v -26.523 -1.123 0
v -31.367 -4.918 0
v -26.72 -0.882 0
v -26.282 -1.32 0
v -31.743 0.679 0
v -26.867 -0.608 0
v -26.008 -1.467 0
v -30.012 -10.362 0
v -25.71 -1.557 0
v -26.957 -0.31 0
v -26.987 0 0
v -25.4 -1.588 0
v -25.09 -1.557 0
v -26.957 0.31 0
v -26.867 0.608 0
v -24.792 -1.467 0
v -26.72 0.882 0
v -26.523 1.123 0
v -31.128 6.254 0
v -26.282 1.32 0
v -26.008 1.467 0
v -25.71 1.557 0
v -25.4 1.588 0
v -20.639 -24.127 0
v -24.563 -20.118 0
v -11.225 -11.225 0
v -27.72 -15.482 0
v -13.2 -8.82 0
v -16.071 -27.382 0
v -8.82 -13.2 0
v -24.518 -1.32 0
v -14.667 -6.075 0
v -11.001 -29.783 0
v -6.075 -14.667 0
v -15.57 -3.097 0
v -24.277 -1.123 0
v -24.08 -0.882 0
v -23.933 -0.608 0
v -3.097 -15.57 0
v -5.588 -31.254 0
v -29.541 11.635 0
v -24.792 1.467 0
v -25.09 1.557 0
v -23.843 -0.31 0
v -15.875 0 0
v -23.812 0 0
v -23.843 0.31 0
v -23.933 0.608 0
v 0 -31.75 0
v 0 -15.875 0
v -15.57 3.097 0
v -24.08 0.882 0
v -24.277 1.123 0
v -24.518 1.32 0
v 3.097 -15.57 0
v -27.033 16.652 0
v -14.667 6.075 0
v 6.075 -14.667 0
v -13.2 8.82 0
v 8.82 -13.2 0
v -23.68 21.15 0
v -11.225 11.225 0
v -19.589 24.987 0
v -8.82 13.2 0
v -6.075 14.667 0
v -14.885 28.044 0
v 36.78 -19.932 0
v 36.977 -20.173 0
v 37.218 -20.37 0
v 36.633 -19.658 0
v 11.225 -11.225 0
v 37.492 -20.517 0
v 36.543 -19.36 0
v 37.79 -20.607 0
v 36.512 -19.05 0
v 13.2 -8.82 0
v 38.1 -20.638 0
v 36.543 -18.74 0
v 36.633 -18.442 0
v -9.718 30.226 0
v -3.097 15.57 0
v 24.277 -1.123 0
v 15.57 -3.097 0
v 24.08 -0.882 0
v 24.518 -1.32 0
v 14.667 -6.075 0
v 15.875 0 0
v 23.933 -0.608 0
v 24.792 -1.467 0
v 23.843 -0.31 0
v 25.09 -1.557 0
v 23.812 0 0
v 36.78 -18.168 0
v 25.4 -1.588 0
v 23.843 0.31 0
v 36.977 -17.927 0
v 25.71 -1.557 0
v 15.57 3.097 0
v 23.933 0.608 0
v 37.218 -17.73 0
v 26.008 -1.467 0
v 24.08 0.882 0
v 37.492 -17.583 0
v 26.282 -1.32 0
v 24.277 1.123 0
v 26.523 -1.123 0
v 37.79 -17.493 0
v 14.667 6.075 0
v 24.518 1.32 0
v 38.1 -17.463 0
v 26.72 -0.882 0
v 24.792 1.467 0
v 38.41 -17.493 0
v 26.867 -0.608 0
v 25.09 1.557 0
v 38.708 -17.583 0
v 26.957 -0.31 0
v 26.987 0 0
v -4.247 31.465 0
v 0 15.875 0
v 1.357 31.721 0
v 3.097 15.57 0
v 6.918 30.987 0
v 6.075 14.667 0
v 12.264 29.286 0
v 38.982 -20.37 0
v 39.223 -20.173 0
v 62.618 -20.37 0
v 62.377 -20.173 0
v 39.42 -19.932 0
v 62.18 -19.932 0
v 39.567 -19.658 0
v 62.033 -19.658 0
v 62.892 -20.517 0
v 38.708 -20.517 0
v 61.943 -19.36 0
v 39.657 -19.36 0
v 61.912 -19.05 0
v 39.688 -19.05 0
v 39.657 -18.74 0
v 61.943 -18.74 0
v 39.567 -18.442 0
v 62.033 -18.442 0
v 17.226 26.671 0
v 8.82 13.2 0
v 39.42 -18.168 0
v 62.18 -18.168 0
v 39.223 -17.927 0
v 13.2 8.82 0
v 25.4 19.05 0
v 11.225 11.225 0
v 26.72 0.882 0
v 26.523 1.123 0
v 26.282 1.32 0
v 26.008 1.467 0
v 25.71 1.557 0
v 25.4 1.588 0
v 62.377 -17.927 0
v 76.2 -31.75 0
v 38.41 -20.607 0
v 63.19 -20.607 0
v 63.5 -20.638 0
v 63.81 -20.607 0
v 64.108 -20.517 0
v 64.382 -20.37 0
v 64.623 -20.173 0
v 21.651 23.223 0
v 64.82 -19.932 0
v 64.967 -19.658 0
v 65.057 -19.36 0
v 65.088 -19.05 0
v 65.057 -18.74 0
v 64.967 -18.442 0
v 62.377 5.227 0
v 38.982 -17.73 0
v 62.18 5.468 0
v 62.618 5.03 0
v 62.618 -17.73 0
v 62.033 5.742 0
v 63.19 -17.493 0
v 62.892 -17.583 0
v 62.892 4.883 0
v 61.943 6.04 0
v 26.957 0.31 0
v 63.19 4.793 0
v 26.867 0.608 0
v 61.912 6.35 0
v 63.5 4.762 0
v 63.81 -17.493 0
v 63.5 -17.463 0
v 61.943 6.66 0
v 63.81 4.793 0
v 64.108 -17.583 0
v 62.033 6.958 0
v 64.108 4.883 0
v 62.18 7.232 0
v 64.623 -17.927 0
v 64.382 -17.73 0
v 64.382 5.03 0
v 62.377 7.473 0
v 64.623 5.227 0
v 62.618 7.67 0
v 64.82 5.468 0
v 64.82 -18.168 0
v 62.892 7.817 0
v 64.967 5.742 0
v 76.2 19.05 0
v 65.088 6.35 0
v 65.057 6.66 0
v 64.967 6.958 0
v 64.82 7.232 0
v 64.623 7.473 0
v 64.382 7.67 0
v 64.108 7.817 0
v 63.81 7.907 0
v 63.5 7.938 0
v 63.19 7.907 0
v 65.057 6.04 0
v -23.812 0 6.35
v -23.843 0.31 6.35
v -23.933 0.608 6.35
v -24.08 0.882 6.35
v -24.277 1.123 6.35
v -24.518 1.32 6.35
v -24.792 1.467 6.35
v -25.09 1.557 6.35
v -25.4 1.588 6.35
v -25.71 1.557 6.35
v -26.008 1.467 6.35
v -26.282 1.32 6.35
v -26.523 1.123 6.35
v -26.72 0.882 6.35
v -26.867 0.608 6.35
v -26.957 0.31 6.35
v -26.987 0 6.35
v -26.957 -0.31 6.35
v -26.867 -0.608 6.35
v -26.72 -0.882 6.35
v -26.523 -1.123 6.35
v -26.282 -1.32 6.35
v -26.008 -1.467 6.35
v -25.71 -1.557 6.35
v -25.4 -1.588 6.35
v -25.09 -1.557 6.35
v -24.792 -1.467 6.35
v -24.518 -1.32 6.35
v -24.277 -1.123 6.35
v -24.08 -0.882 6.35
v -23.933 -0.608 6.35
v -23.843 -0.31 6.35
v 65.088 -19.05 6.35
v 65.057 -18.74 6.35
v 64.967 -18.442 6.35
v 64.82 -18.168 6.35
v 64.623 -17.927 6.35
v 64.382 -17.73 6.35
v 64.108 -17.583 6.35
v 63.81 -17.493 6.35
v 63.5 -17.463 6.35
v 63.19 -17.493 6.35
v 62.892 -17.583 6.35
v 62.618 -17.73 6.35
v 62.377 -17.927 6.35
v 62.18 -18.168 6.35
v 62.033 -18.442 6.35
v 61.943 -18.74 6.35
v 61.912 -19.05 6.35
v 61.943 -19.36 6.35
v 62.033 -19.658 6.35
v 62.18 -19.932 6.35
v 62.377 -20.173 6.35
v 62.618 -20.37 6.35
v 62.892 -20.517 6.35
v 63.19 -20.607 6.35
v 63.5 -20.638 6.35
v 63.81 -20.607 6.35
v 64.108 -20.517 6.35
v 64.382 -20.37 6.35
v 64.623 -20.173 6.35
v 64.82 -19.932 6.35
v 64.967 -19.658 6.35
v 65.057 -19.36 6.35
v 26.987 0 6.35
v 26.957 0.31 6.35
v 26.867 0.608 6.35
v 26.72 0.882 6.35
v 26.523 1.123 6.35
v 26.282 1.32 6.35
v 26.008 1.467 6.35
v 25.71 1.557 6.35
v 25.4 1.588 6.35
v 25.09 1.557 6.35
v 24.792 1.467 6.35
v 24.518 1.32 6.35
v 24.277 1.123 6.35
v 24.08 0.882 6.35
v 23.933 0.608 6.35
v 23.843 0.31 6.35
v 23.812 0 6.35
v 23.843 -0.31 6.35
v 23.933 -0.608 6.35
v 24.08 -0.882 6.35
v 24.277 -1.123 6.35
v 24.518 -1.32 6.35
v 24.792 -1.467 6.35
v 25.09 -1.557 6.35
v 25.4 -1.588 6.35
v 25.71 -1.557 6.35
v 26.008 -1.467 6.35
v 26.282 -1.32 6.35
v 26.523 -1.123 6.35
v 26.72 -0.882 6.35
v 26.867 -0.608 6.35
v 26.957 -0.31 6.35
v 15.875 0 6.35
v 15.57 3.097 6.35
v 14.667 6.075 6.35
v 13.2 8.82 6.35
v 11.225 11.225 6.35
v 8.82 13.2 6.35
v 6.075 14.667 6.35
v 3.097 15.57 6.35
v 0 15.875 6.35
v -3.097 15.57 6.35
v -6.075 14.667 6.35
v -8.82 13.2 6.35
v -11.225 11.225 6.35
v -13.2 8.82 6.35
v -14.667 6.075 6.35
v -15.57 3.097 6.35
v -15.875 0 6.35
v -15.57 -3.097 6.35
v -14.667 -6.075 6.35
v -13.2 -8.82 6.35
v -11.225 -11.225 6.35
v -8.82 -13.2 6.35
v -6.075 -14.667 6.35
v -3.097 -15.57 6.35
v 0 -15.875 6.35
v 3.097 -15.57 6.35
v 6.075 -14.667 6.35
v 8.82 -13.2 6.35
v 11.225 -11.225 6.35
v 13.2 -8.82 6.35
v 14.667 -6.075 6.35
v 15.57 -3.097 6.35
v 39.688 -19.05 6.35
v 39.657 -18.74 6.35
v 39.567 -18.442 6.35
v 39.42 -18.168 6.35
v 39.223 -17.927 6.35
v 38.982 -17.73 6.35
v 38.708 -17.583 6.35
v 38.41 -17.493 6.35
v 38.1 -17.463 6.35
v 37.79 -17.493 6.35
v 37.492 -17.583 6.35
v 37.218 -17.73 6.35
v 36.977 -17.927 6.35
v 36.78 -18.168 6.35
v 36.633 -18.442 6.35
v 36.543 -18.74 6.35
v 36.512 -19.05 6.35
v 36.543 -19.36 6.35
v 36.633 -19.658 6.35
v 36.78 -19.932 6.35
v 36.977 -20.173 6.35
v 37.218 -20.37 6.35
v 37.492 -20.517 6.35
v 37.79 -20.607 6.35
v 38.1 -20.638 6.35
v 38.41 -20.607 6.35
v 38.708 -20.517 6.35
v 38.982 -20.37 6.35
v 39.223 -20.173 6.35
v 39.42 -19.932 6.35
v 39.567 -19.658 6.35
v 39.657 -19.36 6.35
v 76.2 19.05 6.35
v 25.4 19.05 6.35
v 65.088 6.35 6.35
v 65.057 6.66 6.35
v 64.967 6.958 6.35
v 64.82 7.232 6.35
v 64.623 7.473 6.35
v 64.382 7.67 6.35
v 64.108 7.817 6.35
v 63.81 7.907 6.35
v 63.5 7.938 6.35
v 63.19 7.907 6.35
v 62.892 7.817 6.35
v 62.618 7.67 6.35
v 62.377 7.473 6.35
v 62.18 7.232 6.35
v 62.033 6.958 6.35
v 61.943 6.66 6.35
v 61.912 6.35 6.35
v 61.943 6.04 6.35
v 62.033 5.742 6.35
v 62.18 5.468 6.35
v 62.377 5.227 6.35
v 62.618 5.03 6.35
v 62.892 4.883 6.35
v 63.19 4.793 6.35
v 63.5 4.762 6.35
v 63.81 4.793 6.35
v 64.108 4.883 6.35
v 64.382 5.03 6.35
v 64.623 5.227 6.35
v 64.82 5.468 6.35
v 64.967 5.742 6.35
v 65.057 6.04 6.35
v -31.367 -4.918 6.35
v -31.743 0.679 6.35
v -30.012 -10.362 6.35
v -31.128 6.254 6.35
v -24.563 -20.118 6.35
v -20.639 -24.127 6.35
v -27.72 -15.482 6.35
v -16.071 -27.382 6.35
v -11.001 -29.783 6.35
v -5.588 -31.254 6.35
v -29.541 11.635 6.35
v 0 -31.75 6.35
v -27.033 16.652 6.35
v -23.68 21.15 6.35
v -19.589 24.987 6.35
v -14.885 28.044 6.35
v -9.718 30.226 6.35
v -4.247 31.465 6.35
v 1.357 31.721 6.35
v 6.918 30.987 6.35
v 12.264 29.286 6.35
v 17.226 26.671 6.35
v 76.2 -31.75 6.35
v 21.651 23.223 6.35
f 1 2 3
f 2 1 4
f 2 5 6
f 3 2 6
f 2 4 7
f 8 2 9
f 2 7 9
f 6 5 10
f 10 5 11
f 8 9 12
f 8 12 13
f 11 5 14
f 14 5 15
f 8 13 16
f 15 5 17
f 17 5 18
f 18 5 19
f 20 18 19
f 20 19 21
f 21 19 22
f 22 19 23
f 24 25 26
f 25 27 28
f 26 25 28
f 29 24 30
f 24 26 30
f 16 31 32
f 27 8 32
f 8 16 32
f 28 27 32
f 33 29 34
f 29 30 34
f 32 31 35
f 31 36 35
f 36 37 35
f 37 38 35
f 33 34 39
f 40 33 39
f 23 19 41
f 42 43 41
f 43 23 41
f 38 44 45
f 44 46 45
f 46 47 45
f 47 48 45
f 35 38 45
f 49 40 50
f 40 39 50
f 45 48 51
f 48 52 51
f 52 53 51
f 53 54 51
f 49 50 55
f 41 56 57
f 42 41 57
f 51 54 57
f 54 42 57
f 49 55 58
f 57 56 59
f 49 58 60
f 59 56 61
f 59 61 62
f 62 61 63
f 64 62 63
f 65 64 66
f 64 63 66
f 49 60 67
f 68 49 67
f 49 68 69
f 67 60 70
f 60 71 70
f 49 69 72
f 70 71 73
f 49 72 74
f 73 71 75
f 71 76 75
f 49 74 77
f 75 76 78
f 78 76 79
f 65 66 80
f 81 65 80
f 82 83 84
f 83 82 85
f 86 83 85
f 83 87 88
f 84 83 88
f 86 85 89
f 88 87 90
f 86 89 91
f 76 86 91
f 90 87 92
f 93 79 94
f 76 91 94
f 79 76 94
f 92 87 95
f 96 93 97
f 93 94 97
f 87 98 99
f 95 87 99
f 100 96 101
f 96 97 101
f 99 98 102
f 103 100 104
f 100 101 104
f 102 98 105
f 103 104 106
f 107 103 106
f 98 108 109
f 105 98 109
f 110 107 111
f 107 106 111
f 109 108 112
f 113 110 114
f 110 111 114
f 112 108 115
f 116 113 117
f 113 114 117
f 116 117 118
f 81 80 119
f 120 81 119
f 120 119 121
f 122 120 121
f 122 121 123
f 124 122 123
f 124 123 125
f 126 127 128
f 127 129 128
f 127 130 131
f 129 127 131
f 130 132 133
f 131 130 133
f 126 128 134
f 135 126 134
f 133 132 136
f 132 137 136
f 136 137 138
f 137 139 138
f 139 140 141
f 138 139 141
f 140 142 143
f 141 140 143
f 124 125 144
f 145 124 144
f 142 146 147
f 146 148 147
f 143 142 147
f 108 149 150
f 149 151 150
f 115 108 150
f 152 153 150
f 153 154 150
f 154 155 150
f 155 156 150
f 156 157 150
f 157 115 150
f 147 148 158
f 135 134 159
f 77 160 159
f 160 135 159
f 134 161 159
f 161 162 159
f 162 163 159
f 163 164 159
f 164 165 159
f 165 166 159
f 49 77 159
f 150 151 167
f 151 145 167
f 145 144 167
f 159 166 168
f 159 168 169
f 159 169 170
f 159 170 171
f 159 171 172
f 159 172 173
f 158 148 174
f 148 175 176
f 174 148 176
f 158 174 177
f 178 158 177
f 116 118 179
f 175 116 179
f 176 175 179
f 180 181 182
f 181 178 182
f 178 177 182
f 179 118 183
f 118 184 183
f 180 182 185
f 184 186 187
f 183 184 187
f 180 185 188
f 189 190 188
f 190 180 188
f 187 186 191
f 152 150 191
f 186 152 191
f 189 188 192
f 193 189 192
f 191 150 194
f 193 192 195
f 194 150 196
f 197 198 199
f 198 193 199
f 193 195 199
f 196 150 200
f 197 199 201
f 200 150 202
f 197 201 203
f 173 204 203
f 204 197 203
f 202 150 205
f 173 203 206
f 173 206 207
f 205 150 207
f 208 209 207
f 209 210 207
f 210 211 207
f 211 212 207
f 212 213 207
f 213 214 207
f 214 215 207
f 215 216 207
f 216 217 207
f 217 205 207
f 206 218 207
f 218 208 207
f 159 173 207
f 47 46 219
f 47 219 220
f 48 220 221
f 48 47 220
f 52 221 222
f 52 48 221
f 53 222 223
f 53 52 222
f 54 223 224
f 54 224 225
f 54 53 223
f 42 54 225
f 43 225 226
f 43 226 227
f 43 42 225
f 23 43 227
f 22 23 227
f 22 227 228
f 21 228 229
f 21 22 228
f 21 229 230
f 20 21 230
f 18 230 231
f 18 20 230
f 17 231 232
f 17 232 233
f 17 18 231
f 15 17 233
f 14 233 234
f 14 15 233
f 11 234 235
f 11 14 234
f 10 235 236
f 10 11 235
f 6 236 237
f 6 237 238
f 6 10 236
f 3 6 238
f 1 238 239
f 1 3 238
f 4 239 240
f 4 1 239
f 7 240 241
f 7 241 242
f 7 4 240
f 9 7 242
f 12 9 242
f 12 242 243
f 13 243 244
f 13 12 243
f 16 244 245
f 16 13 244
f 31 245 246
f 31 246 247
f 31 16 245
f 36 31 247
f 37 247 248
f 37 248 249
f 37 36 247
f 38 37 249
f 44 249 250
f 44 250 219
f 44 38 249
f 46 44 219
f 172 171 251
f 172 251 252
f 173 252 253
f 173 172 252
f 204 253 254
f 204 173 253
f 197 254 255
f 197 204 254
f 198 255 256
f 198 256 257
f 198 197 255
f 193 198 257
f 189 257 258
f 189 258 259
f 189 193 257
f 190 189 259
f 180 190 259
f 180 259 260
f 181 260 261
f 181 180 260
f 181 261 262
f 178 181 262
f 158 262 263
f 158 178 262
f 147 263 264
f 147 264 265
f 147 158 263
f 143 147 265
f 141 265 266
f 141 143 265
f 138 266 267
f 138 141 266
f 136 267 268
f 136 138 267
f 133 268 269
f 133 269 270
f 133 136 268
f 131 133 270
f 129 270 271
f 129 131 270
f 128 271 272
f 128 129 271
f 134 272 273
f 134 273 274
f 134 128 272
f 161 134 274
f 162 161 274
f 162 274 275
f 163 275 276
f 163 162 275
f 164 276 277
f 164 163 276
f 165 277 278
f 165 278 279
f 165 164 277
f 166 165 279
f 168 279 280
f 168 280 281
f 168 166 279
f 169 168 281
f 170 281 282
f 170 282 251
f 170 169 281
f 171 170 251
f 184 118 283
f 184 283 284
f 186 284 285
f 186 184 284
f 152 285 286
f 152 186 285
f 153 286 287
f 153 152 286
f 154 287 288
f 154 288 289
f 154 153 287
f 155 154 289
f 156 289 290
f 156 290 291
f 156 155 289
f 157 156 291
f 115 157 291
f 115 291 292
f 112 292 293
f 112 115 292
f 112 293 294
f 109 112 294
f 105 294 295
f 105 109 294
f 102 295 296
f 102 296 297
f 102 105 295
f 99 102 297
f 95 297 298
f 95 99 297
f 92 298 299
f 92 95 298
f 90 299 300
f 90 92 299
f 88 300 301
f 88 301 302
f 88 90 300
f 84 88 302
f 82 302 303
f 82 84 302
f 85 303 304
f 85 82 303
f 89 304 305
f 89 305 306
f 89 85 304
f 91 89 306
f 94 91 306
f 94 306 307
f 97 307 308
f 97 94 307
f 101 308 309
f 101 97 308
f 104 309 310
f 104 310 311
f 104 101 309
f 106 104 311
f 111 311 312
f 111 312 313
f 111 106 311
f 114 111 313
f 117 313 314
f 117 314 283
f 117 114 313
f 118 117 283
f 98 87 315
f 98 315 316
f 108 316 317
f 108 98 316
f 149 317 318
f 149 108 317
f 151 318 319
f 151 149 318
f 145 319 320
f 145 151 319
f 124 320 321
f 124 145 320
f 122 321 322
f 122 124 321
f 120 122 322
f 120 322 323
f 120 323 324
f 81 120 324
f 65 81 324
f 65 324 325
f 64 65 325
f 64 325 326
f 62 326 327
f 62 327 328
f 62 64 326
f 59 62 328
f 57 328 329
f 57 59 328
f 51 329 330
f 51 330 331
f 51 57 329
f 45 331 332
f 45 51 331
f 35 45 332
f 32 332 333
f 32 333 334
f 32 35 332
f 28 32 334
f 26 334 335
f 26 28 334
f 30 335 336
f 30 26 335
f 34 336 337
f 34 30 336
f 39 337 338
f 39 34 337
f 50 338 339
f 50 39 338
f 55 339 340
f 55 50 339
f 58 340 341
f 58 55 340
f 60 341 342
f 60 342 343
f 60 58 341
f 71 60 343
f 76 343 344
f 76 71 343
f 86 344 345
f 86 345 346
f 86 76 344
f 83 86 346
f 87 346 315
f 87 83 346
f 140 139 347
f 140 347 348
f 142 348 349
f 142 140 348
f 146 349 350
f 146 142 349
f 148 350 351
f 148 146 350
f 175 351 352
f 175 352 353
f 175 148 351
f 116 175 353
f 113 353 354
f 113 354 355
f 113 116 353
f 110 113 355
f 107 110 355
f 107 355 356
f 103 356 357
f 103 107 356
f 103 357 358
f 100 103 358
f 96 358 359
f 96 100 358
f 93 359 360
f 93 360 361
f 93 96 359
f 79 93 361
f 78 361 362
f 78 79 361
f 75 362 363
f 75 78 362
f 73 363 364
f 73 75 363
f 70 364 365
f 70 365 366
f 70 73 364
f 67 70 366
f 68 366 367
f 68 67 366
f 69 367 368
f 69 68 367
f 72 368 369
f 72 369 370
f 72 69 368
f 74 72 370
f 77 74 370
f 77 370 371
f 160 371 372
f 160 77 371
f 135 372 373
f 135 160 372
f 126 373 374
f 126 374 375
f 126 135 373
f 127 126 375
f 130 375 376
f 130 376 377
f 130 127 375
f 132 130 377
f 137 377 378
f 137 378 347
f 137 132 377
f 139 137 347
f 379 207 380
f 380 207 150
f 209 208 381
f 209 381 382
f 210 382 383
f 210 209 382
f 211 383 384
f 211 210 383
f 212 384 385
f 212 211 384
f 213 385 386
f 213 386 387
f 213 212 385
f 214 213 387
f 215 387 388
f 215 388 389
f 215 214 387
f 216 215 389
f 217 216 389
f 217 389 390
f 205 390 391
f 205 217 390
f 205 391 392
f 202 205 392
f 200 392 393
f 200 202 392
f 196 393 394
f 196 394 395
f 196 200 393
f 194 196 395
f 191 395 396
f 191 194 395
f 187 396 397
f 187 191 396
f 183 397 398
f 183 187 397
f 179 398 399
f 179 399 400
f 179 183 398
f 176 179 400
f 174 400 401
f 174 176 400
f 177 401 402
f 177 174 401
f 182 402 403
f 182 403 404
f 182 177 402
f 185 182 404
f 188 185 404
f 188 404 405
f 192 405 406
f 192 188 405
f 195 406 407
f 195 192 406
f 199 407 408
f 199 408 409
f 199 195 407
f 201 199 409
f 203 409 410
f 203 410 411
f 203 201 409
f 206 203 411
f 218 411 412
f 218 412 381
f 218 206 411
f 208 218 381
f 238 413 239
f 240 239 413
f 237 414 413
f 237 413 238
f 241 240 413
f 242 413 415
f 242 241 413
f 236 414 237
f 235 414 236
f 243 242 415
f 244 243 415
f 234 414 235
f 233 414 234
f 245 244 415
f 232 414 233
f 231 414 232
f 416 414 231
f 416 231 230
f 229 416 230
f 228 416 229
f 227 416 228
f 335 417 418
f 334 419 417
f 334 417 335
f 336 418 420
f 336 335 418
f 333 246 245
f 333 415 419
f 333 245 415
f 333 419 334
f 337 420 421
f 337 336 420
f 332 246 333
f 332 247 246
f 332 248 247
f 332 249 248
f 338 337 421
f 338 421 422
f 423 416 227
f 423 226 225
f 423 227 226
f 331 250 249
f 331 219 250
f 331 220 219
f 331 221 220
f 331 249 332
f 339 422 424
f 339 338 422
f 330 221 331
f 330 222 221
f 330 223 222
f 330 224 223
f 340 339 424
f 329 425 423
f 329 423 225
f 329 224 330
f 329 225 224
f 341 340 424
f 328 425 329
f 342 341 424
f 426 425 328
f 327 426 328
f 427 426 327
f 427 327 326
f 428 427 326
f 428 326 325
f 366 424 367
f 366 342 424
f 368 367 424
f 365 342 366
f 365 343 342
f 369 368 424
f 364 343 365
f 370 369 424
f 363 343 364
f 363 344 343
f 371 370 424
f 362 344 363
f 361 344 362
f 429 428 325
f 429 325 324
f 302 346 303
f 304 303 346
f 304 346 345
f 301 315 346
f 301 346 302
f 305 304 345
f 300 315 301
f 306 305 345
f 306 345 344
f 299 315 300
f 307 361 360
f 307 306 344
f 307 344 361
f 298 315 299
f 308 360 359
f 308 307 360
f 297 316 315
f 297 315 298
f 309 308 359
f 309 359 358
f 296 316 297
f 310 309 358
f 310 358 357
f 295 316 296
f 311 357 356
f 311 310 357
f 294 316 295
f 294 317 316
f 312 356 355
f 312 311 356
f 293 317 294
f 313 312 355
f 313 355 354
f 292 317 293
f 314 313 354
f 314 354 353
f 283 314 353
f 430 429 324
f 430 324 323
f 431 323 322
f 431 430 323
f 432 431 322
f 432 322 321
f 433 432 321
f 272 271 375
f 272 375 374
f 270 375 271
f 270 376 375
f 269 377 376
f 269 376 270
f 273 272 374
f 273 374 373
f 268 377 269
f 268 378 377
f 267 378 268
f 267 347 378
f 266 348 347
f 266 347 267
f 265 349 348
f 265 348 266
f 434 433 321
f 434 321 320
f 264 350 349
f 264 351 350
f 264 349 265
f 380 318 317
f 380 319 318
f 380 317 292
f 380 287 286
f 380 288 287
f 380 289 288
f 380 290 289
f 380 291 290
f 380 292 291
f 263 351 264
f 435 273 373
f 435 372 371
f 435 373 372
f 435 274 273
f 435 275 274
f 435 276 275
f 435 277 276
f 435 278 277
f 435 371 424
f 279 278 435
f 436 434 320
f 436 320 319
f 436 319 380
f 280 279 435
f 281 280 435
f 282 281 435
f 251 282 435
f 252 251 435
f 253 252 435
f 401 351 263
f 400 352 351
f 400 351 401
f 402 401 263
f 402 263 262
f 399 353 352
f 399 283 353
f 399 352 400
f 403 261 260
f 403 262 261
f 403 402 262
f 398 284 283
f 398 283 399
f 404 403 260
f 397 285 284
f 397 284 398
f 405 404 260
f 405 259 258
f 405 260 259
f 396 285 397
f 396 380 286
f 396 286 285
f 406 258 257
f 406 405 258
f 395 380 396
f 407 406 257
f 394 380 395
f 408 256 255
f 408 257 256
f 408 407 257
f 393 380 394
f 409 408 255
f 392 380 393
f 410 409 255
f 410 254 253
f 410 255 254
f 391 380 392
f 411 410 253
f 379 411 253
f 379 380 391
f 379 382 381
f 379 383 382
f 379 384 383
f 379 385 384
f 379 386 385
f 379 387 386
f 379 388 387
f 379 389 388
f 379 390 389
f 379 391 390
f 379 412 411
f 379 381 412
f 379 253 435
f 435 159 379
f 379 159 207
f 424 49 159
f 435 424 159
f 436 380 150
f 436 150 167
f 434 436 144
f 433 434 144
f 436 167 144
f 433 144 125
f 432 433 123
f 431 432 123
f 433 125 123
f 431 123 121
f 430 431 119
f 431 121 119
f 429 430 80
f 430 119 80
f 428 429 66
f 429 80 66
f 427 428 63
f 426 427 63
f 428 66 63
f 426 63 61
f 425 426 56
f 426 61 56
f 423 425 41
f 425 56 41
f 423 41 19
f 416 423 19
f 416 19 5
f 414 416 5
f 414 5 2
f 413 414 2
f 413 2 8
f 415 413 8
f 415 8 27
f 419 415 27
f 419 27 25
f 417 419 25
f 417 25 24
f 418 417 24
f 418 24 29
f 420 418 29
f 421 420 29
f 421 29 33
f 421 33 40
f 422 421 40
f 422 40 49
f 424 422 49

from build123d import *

# Parameters (mm, degrees)
SKETCH1_R           = 15.875
SKETCH1_R_2         = 1.5875
BOSS_EXTRUDE1_DEPTH = 6.35
BOSS_EXTRUDE2_START = -6.35
SKETCH2_R           = 1.5875
BOSS_EXTRUDE2_DEPTH = 6.35


with BuildPart() as part:
    # Sketch1 → Boss-Extrude1 (new body)
    with BuildSketch(Plane.XY):
        with BuildLine():
            Line((0, -31.75), (76.2, -31.75))
            Line((76.2, -31.75), (76.2, -6.35))
            Line((76.2, -6.35), (31.108519733, -6.35))
            ThreePointArc((31.108519733, -6.35), (-20.080463142, 24.593444248), (0, -31.75))
        make_face()
        Circle(SKETCH1_R, mode=Mode.SUBTRACT)
        with Locations((-25.4, 0)):
            Circle(SKETCH1_R_2, mode=Mode.SUBTRACT)
        with Locations((25.4, 0)):
            Circle(SKETCH1_R_2, mode=Mode.SUBTRACT)
        with Locations((38.1, -19.05)):
            Circle(SKETCH1_R_2, mode=Mode.SUBTRACT)
        with Locations((63.5, -19.05)):
            Circle(SKETCH1_R_2, mode=Mode.SUBTRACT)
    extrude(amount=BOSS_EXTRUDE1_DEPTH)

    # Sketch2 → Boss-Extrude2 (add)
    with BuildSketch(Plane.XY.offset(6.35).offset(BOSS_EXTRUDE2_START)):
        with BuildLine():
            Line((76.2, -6.35), (76.2, 19.05))
            Line((76.2, 19.05), (25.4, 19.05))
            ThreePointArc((25.4, 19.05), (30.977301377, 6.961989614), (31.108519733, -6.35))
            Line((31.108519733, -6.35), (76.2, -6.35))
        make_face()
        with Locations((63.5, 6.35)):
            Circle(SKETCH2_R, mode=Mode.SUBTRACT)
    extrude(amount=BOSS_EXTRUDE2_DEPTH)


solid = part.part
